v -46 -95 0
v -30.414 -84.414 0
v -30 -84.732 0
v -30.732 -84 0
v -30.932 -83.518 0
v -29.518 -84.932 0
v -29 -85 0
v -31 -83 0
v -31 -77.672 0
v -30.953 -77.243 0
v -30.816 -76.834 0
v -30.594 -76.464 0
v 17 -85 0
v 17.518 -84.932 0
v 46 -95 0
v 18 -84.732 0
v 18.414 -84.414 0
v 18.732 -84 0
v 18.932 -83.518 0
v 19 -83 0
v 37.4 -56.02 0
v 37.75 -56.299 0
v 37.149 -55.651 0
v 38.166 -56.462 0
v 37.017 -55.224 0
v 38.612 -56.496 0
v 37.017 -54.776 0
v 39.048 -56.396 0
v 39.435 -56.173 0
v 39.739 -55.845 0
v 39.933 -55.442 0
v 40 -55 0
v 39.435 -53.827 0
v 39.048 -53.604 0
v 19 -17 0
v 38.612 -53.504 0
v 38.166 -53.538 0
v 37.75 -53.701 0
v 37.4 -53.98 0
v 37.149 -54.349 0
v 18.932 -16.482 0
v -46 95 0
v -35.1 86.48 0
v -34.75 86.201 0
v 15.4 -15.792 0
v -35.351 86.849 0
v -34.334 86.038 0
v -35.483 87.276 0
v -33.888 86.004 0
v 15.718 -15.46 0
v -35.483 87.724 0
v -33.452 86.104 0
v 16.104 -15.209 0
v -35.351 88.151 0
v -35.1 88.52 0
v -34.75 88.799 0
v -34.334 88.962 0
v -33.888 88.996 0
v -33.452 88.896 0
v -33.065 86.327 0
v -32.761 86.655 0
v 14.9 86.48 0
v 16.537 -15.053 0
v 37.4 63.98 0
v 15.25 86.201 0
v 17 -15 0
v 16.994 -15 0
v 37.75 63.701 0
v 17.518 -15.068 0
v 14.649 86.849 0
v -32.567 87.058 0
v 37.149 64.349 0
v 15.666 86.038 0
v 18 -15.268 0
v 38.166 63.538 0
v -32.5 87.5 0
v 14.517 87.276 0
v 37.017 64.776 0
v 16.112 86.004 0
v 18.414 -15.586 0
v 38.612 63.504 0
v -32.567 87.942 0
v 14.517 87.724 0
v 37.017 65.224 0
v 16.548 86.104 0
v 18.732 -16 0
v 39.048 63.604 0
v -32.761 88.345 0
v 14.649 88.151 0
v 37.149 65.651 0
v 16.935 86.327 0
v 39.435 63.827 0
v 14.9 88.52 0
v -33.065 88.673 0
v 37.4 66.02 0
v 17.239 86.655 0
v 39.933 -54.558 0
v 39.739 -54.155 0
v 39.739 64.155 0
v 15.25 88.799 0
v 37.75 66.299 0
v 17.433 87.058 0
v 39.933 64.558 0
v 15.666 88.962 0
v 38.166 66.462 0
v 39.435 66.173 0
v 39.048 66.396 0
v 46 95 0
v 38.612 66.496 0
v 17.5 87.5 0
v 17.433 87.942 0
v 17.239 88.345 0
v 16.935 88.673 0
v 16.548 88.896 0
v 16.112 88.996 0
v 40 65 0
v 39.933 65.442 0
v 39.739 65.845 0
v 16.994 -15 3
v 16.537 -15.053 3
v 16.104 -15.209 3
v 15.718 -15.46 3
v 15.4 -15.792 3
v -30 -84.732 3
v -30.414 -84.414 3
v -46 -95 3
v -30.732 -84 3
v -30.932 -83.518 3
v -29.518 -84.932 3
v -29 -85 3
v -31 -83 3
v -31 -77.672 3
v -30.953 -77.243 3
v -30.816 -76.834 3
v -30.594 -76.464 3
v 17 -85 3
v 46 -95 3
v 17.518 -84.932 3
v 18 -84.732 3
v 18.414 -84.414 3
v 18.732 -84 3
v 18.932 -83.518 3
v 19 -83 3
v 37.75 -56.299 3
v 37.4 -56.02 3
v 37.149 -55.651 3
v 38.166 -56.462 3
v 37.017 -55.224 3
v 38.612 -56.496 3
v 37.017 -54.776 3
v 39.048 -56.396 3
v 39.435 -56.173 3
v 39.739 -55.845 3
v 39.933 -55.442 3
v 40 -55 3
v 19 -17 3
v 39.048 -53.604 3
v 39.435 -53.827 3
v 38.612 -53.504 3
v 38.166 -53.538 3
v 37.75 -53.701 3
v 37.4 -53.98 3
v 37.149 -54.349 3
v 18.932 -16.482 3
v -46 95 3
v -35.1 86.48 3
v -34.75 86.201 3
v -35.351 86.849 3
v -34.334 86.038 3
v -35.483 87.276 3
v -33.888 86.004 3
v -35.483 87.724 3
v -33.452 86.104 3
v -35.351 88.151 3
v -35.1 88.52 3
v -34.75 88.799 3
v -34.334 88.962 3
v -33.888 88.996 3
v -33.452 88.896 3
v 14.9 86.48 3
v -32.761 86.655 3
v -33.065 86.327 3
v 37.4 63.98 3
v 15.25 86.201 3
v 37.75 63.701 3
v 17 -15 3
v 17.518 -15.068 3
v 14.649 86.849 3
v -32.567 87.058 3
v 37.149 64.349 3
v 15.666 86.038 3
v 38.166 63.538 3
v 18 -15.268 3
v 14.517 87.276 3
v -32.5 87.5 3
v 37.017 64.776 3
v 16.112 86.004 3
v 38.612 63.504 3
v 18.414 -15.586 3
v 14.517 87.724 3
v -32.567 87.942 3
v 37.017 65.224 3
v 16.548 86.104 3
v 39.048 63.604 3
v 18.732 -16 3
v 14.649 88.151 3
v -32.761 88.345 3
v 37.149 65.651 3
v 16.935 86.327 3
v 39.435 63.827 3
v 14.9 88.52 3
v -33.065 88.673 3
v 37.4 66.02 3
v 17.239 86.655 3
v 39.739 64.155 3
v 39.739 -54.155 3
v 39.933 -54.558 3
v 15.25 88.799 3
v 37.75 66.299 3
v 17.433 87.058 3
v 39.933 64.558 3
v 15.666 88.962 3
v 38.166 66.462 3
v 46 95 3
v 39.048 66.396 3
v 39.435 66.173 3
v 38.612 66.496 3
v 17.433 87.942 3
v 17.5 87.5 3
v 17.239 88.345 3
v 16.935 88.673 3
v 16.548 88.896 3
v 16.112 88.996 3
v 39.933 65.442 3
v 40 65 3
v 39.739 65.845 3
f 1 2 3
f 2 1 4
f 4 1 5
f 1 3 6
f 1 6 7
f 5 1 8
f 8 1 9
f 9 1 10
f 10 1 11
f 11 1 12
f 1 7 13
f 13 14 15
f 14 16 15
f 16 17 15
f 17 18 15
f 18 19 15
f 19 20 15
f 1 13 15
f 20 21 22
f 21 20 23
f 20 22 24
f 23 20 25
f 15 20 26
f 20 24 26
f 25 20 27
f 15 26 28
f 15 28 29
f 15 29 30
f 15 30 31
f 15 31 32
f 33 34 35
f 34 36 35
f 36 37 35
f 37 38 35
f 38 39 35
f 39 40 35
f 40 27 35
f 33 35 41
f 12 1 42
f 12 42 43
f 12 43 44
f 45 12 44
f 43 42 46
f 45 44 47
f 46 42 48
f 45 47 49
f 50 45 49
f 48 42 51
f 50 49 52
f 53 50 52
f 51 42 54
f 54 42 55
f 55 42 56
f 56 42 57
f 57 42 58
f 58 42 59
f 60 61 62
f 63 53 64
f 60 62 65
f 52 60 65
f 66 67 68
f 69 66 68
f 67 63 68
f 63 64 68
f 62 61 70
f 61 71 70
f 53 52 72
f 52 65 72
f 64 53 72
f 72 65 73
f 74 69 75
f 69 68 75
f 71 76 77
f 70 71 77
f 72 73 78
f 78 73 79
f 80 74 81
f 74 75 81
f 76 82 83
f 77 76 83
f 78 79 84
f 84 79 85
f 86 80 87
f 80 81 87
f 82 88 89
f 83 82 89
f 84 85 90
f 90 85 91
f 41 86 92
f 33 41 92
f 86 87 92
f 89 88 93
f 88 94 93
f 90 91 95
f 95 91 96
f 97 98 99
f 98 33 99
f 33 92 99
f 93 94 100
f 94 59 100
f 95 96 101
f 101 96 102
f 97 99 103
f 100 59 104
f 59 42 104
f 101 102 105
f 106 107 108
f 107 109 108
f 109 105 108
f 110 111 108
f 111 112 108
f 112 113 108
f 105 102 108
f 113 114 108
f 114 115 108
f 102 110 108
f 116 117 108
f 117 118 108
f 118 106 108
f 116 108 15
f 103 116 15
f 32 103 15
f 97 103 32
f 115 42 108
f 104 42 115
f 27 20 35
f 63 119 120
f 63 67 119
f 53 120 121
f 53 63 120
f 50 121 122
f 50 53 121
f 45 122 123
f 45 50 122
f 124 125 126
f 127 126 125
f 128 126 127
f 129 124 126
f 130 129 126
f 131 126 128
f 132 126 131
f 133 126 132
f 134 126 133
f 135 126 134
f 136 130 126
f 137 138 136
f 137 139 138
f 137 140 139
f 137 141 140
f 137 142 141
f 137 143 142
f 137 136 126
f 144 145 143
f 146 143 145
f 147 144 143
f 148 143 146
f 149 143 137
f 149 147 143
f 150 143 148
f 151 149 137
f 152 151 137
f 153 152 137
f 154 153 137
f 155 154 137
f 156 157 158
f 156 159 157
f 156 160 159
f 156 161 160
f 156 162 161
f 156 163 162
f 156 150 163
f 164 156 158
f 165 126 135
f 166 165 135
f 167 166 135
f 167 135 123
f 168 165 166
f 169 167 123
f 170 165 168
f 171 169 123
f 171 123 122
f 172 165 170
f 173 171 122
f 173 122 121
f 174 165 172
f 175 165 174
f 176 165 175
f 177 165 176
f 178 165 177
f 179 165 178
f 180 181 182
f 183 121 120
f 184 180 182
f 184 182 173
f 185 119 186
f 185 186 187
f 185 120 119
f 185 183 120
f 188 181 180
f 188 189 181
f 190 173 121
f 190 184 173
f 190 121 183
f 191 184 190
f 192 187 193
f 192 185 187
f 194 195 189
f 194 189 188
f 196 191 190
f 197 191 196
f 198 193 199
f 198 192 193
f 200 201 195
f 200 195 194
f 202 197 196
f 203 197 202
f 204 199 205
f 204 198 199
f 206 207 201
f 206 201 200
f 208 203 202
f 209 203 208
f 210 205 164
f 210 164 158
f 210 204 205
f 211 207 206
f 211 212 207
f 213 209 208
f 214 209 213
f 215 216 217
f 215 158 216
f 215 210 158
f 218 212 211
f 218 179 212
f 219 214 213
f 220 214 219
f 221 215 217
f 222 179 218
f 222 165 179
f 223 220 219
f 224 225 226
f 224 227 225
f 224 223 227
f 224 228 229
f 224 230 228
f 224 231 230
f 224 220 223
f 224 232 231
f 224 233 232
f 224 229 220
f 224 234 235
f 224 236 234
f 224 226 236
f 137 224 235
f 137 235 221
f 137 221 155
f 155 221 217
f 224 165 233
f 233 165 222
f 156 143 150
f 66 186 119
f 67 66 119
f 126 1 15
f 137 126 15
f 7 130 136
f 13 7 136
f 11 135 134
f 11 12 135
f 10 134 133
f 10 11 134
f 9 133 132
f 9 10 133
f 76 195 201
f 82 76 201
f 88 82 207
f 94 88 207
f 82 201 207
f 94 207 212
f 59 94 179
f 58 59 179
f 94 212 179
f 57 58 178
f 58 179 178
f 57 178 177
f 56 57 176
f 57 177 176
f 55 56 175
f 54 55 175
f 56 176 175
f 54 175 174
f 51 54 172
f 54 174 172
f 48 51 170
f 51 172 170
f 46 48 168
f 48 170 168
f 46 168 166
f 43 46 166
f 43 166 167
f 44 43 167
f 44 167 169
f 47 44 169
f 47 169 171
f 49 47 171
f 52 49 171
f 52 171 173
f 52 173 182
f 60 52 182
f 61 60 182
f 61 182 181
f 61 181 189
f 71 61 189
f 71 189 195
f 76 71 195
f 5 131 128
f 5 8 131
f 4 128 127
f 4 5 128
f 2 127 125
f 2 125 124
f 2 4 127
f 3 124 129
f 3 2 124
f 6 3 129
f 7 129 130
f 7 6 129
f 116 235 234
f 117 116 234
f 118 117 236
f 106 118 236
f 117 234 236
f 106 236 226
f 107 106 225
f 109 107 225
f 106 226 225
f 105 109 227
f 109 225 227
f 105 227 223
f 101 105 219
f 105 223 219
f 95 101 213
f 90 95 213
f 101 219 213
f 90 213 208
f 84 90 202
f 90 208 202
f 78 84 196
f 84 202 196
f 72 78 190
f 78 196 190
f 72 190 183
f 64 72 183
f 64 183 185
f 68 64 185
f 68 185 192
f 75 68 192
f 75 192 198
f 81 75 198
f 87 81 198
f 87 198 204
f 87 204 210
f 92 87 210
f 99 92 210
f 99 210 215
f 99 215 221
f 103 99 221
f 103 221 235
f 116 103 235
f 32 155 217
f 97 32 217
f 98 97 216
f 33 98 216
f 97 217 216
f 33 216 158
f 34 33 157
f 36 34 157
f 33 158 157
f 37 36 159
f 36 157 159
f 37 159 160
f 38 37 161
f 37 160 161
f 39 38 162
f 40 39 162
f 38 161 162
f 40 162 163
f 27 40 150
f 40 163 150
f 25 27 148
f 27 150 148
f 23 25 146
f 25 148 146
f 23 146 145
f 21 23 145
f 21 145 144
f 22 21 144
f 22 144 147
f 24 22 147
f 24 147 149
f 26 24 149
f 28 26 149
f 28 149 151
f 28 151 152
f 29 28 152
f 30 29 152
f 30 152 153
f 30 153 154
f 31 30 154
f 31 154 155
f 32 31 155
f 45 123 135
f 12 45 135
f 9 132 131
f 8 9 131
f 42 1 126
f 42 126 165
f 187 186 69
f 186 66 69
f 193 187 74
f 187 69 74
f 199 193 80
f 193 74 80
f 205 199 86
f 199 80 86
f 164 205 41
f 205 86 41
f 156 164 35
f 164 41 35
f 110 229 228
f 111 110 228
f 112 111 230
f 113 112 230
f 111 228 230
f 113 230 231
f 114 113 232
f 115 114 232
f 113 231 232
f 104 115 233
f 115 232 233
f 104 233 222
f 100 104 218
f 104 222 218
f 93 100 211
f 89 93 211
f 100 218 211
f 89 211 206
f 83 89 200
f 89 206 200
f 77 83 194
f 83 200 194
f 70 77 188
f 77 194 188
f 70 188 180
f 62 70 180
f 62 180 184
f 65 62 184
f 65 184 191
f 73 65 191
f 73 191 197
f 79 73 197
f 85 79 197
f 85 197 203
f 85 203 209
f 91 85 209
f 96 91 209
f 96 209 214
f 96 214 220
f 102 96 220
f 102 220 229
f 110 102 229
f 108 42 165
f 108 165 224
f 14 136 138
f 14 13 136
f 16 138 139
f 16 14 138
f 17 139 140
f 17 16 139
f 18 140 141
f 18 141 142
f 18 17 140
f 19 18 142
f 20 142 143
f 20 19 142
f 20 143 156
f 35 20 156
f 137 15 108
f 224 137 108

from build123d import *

# Parameters (mm, degrees)
SKETCH_1_W          = 92
SKETCH_1_H          = 190
EXTRUDE_1_DEPTH     = 3
SKETCH_2_R          = 1.5
CUT_EXTRUDE_1_DEPTH = 106.59356041
CUT_EXTRUDE_2_DEPTH = 106.59356041
FILLET_2_R          = 2


with BuildPart() as part:
    # 草图1 → 凸台-拉伸1 (new body)
    with BuildSketch(Plane.XY):
        Rectangle(SKETCH_1_W, SKETCH_1_H)
    extrude(amount=EXTRUDE_1_DEPTH)

    # 草图2 → 切除-拉伸1 (cut, through all)
    with BuildSketch(Plane.XY.offset(3)):
        with Locations((-34, 87.5)):
            Circle(SKETCH_2_R)
        with Locations((16, 87.5)):
            Circle(SKETCH_2_R)
        with Locations((38.5, 65)):
            Circle(SKETCH_2_R)
        with Locations((38.5, -55)):
            Circle(SKETCH_2_R)
    extrude(amount=-CUT_EXTRUDE_1_DEPTH, mode=Mode.SUBTRACT)

    # 草图3 → 切除-拉伸2 (cut, through all)
    with BuildSketch(Plane.XY.offset(3)):
        Polygon((19, -15), (16, -15), (-31, -77), (-31, -85), (19, -85), align=None)
    extrude(amount=-CUT_EXTRUDE_2_DEPTH, mode=Mode.SUBTRACT)

    # 圆角2
    fillet_2_edges = [part.edges().sort_by_distance(p)[0] for p in [
        (-31, -77, 1.5),
        (16, -15, 1.5),
        (19, -15, 1.5),
        (19, -85, 1.5),
        (-31, -85, 1.5),
    ]]
    fillet(fillet_2_edges, radius=FILLET_2_R)


solid = part.part
